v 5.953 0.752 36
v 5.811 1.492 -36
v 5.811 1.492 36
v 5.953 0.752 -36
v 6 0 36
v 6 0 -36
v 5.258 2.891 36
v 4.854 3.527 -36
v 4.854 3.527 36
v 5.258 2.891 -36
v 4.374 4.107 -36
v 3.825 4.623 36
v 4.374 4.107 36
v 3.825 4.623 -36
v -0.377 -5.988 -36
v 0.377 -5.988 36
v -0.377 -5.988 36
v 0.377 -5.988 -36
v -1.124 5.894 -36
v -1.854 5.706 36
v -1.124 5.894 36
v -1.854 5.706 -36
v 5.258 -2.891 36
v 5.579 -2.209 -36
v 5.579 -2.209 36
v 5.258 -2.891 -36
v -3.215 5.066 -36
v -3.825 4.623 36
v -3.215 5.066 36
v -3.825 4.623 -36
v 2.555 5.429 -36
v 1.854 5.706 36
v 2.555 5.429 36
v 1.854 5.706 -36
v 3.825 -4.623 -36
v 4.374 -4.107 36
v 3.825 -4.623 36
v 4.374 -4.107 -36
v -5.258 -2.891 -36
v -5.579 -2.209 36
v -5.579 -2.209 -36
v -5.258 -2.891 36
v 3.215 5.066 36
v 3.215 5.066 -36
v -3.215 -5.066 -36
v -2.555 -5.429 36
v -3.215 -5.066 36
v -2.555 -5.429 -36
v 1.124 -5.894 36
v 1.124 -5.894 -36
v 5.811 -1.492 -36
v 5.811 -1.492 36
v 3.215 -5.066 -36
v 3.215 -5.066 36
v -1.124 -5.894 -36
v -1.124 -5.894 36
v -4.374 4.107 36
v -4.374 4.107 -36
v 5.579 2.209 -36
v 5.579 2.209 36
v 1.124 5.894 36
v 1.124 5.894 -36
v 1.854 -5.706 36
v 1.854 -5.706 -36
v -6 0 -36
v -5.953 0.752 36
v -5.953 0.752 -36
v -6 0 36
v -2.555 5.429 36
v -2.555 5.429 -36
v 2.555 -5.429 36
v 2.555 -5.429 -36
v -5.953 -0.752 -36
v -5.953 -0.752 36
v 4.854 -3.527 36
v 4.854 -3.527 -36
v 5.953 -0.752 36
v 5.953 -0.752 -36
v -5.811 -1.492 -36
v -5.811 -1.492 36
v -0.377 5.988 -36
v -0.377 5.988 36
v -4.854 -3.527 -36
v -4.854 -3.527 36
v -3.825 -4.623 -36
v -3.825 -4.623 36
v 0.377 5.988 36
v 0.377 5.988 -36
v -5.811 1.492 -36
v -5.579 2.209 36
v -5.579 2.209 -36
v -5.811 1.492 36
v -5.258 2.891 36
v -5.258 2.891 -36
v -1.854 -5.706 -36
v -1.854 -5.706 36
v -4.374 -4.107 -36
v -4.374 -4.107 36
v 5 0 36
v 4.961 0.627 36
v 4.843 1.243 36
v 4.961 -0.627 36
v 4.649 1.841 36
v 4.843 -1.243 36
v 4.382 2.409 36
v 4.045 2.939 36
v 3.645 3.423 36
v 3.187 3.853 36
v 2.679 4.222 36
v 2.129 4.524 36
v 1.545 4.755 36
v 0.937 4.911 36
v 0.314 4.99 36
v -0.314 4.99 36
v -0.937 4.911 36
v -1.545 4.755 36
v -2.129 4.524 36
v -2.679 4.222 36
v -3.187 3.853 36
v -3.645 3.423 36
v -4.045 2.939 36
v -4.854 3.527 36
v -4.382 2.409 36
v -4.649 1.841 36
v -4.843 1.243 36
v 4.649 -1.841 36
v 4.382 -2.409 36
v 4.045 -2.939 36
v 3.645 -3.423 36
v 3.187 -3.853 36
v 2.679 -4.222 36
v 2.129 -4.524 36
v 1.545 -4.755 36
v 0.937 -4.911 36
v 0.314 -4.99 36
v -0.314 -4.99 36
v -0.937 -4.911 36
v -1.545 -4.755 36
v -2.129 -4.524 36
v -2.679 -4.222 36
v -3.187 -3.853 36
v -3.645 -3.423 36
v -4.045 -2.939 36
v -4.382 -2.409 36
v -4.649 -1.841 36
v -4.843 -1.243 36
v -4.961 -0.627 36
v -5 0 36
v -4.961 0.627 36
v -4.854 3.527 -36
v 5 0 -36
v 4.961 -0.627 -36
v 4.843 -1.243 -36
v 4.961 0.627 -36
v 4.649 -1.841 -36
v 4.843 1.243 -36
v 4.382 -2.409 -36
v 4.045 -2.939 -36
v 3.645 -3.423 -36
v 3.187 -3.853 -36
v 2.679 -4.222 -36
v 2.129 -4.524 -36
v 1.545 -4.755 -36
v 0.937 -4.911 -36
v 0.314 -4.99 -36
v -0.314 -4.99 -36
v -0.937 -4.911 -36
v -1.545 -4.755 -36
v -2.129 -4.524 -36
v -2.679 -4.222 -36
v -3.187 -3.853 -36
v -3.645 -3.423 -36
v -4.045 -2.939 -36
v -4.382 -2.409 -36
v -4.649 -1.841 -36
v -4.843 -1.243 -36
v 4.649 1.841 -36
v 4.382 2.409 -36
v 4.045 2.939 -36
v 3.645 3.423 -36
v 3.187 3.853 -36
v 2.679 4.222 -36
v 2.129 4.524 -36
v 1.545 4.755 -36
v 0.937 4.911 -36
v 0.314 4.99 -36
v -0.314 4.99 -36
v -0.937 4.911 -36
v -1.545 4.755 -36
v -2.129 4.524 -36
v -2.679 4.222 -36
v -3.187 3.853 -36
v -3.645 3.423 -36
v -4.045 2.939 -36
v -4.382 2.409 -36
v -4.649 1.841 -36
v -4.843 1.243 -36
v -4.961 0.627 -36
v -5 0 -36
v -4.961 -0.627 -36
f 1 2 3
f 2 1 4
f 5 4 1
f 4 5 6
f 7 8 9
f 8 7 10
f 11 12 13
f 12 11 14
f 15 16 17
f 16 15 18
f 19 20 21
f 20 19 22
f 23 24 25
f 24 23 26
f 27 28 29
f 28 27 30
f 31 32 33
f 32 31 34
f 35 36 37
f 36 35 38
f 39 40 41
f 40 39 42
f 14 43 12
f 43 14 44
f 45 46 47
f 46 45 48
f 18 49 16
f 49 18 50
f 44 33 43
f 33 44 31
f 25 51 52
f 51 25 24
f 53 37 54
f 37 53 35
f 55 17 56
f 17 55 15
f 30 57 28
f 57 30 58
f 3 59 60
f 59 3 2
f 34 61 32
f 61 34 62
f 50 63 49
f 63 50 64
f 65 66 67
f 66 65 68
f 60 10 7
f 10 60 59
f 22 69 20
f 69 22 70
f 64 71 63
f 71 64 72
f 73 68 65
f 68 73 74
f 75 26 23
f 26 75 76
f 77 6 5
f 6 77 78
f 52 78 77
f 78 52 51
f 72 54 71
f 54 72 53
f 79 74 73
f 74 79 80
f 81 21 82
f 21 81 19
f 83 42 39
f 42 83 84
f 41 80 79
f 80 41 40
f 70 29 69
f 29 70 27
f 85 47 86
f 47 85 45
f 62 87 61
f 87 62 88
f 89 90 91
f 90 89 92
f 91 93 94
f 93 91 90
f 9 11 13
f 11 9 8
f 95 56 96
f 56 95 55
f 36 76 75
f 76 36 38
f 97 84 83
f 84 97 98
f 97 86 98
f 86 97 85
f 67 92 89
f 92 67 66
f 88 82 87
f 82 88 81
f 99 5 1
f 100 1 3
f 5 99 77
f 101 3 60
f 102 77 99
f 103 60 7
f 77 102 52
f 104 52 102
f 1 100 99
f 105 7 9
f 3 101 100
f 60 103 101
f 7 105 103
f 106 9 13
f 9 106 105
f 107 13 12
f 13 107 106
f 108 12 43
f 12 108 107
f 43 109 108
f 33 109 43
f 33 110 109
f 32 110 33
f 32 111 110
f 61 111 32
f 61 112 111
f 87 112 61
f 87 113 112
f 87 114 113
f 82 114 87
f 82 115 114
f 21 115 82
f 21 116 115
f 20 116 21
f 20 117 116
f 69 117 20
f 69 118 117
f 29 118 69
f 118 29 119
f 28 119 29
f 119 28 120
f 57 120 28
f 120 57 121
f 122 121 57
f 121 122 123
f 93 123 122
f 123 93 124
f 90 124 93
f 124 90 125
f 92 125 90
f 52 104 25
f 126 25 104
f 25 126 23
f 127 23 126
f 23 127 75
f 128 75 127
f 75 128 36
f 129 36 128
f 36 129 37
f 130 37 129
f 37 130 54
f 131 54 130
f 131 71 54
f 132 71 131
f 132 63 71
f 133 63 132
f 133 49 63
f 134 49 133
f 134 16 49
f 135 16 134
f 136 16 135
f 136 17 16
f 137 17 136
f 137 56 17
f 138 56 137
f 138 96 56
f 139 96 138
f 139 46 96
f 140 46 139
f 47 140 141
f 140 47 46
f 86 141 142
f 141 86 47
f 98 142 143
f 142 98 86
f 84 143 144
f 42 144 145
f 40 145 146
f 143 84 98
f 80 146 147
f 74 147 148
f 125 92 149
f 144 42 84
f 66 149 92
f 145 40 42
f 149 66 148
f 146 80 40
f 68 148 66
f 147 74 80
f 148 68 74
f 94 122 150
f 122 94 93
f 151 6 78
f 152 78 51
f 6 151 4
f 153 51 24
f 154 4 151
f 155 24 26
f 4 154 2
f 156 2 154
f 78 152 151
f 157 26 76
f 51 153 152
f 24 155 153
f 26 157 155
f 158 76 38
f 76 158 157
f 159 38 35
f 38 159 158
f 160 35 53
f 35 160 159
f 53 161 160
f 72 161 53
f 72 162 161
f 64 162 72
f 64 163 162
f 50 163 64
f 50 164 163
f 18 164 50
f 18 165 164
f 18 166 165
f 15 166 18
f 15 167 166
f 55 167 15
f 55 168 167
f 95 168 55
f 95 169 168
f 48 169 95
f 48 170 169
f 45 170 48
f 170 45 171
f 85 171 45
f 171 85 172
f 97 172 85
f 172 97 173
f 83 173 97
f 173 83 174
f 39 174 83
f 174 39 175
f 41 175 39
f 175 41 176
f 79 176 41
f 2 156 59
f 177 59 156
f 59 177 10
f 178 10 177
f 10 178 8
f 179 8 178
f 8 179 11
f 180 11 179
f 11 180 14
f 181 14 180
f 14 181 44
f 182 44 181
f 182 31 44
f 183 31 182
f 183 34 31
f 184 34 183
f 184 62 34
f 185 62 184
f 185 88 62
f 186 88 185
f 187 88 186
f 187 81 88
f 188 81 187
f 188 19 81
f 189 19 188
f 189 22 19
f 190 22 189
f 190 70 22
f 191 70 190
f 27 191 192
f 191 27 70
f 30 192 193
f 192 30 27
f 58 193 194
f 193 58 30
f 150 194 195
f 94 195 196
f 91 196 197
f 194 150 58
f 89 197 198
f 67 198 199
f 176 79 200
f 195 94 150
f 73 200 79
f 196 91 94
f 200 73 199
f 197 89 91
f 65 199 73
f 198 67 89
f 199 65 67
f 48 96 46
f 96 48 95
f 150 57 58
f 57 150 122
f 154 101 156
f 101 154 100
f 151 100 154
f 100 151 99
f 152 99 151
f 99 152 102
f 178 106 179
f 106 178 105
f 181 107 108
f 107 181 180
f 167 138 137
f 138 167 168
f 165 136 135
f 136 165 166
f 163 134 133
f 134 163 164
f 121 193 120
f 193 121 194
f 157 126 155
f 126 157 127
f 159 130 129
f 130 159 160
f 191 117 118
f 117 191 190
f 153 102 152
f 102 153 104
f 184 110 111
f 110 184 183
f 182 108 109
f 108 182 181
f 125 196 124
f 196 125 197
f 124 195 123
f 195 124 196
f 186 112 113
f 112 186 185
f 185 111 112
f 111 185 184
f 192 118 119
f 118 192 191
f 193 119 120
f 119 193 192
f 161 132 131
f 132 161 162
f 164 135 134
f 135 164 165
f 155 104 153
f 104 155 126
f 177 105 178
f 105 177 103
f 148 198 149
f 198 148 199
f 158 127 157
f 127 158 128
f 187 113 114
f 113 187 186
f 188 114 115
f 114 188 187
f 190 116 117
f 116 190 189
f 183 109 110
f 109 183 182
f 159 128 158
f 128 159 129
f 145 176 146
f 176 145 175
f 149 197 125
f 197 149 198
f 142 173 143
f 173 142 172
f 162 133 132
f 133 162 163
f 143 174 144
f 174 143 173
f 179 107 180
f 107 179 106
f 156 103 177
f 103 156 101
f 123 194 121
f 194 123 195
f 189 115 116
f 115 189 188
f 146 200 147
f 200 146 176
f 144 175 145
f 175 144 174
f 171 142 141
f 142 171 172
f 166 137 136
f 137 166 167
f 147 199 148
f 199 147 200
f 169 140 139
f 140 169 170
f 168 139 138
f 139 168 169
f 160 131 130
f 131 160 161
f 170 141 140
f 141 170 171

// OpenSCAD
$fn = 50;


difference() {
	union() {
		translate(v = [0, 0, -36.0000000000]) {
			cylinder(h = 72, r = 6.0000000000);
		}
	}
	union() {
		translate(v = [0, 0, -100.0000000000]) {
			cylinder(h = 200, r = 5.0000000000);
		}
	}
}
